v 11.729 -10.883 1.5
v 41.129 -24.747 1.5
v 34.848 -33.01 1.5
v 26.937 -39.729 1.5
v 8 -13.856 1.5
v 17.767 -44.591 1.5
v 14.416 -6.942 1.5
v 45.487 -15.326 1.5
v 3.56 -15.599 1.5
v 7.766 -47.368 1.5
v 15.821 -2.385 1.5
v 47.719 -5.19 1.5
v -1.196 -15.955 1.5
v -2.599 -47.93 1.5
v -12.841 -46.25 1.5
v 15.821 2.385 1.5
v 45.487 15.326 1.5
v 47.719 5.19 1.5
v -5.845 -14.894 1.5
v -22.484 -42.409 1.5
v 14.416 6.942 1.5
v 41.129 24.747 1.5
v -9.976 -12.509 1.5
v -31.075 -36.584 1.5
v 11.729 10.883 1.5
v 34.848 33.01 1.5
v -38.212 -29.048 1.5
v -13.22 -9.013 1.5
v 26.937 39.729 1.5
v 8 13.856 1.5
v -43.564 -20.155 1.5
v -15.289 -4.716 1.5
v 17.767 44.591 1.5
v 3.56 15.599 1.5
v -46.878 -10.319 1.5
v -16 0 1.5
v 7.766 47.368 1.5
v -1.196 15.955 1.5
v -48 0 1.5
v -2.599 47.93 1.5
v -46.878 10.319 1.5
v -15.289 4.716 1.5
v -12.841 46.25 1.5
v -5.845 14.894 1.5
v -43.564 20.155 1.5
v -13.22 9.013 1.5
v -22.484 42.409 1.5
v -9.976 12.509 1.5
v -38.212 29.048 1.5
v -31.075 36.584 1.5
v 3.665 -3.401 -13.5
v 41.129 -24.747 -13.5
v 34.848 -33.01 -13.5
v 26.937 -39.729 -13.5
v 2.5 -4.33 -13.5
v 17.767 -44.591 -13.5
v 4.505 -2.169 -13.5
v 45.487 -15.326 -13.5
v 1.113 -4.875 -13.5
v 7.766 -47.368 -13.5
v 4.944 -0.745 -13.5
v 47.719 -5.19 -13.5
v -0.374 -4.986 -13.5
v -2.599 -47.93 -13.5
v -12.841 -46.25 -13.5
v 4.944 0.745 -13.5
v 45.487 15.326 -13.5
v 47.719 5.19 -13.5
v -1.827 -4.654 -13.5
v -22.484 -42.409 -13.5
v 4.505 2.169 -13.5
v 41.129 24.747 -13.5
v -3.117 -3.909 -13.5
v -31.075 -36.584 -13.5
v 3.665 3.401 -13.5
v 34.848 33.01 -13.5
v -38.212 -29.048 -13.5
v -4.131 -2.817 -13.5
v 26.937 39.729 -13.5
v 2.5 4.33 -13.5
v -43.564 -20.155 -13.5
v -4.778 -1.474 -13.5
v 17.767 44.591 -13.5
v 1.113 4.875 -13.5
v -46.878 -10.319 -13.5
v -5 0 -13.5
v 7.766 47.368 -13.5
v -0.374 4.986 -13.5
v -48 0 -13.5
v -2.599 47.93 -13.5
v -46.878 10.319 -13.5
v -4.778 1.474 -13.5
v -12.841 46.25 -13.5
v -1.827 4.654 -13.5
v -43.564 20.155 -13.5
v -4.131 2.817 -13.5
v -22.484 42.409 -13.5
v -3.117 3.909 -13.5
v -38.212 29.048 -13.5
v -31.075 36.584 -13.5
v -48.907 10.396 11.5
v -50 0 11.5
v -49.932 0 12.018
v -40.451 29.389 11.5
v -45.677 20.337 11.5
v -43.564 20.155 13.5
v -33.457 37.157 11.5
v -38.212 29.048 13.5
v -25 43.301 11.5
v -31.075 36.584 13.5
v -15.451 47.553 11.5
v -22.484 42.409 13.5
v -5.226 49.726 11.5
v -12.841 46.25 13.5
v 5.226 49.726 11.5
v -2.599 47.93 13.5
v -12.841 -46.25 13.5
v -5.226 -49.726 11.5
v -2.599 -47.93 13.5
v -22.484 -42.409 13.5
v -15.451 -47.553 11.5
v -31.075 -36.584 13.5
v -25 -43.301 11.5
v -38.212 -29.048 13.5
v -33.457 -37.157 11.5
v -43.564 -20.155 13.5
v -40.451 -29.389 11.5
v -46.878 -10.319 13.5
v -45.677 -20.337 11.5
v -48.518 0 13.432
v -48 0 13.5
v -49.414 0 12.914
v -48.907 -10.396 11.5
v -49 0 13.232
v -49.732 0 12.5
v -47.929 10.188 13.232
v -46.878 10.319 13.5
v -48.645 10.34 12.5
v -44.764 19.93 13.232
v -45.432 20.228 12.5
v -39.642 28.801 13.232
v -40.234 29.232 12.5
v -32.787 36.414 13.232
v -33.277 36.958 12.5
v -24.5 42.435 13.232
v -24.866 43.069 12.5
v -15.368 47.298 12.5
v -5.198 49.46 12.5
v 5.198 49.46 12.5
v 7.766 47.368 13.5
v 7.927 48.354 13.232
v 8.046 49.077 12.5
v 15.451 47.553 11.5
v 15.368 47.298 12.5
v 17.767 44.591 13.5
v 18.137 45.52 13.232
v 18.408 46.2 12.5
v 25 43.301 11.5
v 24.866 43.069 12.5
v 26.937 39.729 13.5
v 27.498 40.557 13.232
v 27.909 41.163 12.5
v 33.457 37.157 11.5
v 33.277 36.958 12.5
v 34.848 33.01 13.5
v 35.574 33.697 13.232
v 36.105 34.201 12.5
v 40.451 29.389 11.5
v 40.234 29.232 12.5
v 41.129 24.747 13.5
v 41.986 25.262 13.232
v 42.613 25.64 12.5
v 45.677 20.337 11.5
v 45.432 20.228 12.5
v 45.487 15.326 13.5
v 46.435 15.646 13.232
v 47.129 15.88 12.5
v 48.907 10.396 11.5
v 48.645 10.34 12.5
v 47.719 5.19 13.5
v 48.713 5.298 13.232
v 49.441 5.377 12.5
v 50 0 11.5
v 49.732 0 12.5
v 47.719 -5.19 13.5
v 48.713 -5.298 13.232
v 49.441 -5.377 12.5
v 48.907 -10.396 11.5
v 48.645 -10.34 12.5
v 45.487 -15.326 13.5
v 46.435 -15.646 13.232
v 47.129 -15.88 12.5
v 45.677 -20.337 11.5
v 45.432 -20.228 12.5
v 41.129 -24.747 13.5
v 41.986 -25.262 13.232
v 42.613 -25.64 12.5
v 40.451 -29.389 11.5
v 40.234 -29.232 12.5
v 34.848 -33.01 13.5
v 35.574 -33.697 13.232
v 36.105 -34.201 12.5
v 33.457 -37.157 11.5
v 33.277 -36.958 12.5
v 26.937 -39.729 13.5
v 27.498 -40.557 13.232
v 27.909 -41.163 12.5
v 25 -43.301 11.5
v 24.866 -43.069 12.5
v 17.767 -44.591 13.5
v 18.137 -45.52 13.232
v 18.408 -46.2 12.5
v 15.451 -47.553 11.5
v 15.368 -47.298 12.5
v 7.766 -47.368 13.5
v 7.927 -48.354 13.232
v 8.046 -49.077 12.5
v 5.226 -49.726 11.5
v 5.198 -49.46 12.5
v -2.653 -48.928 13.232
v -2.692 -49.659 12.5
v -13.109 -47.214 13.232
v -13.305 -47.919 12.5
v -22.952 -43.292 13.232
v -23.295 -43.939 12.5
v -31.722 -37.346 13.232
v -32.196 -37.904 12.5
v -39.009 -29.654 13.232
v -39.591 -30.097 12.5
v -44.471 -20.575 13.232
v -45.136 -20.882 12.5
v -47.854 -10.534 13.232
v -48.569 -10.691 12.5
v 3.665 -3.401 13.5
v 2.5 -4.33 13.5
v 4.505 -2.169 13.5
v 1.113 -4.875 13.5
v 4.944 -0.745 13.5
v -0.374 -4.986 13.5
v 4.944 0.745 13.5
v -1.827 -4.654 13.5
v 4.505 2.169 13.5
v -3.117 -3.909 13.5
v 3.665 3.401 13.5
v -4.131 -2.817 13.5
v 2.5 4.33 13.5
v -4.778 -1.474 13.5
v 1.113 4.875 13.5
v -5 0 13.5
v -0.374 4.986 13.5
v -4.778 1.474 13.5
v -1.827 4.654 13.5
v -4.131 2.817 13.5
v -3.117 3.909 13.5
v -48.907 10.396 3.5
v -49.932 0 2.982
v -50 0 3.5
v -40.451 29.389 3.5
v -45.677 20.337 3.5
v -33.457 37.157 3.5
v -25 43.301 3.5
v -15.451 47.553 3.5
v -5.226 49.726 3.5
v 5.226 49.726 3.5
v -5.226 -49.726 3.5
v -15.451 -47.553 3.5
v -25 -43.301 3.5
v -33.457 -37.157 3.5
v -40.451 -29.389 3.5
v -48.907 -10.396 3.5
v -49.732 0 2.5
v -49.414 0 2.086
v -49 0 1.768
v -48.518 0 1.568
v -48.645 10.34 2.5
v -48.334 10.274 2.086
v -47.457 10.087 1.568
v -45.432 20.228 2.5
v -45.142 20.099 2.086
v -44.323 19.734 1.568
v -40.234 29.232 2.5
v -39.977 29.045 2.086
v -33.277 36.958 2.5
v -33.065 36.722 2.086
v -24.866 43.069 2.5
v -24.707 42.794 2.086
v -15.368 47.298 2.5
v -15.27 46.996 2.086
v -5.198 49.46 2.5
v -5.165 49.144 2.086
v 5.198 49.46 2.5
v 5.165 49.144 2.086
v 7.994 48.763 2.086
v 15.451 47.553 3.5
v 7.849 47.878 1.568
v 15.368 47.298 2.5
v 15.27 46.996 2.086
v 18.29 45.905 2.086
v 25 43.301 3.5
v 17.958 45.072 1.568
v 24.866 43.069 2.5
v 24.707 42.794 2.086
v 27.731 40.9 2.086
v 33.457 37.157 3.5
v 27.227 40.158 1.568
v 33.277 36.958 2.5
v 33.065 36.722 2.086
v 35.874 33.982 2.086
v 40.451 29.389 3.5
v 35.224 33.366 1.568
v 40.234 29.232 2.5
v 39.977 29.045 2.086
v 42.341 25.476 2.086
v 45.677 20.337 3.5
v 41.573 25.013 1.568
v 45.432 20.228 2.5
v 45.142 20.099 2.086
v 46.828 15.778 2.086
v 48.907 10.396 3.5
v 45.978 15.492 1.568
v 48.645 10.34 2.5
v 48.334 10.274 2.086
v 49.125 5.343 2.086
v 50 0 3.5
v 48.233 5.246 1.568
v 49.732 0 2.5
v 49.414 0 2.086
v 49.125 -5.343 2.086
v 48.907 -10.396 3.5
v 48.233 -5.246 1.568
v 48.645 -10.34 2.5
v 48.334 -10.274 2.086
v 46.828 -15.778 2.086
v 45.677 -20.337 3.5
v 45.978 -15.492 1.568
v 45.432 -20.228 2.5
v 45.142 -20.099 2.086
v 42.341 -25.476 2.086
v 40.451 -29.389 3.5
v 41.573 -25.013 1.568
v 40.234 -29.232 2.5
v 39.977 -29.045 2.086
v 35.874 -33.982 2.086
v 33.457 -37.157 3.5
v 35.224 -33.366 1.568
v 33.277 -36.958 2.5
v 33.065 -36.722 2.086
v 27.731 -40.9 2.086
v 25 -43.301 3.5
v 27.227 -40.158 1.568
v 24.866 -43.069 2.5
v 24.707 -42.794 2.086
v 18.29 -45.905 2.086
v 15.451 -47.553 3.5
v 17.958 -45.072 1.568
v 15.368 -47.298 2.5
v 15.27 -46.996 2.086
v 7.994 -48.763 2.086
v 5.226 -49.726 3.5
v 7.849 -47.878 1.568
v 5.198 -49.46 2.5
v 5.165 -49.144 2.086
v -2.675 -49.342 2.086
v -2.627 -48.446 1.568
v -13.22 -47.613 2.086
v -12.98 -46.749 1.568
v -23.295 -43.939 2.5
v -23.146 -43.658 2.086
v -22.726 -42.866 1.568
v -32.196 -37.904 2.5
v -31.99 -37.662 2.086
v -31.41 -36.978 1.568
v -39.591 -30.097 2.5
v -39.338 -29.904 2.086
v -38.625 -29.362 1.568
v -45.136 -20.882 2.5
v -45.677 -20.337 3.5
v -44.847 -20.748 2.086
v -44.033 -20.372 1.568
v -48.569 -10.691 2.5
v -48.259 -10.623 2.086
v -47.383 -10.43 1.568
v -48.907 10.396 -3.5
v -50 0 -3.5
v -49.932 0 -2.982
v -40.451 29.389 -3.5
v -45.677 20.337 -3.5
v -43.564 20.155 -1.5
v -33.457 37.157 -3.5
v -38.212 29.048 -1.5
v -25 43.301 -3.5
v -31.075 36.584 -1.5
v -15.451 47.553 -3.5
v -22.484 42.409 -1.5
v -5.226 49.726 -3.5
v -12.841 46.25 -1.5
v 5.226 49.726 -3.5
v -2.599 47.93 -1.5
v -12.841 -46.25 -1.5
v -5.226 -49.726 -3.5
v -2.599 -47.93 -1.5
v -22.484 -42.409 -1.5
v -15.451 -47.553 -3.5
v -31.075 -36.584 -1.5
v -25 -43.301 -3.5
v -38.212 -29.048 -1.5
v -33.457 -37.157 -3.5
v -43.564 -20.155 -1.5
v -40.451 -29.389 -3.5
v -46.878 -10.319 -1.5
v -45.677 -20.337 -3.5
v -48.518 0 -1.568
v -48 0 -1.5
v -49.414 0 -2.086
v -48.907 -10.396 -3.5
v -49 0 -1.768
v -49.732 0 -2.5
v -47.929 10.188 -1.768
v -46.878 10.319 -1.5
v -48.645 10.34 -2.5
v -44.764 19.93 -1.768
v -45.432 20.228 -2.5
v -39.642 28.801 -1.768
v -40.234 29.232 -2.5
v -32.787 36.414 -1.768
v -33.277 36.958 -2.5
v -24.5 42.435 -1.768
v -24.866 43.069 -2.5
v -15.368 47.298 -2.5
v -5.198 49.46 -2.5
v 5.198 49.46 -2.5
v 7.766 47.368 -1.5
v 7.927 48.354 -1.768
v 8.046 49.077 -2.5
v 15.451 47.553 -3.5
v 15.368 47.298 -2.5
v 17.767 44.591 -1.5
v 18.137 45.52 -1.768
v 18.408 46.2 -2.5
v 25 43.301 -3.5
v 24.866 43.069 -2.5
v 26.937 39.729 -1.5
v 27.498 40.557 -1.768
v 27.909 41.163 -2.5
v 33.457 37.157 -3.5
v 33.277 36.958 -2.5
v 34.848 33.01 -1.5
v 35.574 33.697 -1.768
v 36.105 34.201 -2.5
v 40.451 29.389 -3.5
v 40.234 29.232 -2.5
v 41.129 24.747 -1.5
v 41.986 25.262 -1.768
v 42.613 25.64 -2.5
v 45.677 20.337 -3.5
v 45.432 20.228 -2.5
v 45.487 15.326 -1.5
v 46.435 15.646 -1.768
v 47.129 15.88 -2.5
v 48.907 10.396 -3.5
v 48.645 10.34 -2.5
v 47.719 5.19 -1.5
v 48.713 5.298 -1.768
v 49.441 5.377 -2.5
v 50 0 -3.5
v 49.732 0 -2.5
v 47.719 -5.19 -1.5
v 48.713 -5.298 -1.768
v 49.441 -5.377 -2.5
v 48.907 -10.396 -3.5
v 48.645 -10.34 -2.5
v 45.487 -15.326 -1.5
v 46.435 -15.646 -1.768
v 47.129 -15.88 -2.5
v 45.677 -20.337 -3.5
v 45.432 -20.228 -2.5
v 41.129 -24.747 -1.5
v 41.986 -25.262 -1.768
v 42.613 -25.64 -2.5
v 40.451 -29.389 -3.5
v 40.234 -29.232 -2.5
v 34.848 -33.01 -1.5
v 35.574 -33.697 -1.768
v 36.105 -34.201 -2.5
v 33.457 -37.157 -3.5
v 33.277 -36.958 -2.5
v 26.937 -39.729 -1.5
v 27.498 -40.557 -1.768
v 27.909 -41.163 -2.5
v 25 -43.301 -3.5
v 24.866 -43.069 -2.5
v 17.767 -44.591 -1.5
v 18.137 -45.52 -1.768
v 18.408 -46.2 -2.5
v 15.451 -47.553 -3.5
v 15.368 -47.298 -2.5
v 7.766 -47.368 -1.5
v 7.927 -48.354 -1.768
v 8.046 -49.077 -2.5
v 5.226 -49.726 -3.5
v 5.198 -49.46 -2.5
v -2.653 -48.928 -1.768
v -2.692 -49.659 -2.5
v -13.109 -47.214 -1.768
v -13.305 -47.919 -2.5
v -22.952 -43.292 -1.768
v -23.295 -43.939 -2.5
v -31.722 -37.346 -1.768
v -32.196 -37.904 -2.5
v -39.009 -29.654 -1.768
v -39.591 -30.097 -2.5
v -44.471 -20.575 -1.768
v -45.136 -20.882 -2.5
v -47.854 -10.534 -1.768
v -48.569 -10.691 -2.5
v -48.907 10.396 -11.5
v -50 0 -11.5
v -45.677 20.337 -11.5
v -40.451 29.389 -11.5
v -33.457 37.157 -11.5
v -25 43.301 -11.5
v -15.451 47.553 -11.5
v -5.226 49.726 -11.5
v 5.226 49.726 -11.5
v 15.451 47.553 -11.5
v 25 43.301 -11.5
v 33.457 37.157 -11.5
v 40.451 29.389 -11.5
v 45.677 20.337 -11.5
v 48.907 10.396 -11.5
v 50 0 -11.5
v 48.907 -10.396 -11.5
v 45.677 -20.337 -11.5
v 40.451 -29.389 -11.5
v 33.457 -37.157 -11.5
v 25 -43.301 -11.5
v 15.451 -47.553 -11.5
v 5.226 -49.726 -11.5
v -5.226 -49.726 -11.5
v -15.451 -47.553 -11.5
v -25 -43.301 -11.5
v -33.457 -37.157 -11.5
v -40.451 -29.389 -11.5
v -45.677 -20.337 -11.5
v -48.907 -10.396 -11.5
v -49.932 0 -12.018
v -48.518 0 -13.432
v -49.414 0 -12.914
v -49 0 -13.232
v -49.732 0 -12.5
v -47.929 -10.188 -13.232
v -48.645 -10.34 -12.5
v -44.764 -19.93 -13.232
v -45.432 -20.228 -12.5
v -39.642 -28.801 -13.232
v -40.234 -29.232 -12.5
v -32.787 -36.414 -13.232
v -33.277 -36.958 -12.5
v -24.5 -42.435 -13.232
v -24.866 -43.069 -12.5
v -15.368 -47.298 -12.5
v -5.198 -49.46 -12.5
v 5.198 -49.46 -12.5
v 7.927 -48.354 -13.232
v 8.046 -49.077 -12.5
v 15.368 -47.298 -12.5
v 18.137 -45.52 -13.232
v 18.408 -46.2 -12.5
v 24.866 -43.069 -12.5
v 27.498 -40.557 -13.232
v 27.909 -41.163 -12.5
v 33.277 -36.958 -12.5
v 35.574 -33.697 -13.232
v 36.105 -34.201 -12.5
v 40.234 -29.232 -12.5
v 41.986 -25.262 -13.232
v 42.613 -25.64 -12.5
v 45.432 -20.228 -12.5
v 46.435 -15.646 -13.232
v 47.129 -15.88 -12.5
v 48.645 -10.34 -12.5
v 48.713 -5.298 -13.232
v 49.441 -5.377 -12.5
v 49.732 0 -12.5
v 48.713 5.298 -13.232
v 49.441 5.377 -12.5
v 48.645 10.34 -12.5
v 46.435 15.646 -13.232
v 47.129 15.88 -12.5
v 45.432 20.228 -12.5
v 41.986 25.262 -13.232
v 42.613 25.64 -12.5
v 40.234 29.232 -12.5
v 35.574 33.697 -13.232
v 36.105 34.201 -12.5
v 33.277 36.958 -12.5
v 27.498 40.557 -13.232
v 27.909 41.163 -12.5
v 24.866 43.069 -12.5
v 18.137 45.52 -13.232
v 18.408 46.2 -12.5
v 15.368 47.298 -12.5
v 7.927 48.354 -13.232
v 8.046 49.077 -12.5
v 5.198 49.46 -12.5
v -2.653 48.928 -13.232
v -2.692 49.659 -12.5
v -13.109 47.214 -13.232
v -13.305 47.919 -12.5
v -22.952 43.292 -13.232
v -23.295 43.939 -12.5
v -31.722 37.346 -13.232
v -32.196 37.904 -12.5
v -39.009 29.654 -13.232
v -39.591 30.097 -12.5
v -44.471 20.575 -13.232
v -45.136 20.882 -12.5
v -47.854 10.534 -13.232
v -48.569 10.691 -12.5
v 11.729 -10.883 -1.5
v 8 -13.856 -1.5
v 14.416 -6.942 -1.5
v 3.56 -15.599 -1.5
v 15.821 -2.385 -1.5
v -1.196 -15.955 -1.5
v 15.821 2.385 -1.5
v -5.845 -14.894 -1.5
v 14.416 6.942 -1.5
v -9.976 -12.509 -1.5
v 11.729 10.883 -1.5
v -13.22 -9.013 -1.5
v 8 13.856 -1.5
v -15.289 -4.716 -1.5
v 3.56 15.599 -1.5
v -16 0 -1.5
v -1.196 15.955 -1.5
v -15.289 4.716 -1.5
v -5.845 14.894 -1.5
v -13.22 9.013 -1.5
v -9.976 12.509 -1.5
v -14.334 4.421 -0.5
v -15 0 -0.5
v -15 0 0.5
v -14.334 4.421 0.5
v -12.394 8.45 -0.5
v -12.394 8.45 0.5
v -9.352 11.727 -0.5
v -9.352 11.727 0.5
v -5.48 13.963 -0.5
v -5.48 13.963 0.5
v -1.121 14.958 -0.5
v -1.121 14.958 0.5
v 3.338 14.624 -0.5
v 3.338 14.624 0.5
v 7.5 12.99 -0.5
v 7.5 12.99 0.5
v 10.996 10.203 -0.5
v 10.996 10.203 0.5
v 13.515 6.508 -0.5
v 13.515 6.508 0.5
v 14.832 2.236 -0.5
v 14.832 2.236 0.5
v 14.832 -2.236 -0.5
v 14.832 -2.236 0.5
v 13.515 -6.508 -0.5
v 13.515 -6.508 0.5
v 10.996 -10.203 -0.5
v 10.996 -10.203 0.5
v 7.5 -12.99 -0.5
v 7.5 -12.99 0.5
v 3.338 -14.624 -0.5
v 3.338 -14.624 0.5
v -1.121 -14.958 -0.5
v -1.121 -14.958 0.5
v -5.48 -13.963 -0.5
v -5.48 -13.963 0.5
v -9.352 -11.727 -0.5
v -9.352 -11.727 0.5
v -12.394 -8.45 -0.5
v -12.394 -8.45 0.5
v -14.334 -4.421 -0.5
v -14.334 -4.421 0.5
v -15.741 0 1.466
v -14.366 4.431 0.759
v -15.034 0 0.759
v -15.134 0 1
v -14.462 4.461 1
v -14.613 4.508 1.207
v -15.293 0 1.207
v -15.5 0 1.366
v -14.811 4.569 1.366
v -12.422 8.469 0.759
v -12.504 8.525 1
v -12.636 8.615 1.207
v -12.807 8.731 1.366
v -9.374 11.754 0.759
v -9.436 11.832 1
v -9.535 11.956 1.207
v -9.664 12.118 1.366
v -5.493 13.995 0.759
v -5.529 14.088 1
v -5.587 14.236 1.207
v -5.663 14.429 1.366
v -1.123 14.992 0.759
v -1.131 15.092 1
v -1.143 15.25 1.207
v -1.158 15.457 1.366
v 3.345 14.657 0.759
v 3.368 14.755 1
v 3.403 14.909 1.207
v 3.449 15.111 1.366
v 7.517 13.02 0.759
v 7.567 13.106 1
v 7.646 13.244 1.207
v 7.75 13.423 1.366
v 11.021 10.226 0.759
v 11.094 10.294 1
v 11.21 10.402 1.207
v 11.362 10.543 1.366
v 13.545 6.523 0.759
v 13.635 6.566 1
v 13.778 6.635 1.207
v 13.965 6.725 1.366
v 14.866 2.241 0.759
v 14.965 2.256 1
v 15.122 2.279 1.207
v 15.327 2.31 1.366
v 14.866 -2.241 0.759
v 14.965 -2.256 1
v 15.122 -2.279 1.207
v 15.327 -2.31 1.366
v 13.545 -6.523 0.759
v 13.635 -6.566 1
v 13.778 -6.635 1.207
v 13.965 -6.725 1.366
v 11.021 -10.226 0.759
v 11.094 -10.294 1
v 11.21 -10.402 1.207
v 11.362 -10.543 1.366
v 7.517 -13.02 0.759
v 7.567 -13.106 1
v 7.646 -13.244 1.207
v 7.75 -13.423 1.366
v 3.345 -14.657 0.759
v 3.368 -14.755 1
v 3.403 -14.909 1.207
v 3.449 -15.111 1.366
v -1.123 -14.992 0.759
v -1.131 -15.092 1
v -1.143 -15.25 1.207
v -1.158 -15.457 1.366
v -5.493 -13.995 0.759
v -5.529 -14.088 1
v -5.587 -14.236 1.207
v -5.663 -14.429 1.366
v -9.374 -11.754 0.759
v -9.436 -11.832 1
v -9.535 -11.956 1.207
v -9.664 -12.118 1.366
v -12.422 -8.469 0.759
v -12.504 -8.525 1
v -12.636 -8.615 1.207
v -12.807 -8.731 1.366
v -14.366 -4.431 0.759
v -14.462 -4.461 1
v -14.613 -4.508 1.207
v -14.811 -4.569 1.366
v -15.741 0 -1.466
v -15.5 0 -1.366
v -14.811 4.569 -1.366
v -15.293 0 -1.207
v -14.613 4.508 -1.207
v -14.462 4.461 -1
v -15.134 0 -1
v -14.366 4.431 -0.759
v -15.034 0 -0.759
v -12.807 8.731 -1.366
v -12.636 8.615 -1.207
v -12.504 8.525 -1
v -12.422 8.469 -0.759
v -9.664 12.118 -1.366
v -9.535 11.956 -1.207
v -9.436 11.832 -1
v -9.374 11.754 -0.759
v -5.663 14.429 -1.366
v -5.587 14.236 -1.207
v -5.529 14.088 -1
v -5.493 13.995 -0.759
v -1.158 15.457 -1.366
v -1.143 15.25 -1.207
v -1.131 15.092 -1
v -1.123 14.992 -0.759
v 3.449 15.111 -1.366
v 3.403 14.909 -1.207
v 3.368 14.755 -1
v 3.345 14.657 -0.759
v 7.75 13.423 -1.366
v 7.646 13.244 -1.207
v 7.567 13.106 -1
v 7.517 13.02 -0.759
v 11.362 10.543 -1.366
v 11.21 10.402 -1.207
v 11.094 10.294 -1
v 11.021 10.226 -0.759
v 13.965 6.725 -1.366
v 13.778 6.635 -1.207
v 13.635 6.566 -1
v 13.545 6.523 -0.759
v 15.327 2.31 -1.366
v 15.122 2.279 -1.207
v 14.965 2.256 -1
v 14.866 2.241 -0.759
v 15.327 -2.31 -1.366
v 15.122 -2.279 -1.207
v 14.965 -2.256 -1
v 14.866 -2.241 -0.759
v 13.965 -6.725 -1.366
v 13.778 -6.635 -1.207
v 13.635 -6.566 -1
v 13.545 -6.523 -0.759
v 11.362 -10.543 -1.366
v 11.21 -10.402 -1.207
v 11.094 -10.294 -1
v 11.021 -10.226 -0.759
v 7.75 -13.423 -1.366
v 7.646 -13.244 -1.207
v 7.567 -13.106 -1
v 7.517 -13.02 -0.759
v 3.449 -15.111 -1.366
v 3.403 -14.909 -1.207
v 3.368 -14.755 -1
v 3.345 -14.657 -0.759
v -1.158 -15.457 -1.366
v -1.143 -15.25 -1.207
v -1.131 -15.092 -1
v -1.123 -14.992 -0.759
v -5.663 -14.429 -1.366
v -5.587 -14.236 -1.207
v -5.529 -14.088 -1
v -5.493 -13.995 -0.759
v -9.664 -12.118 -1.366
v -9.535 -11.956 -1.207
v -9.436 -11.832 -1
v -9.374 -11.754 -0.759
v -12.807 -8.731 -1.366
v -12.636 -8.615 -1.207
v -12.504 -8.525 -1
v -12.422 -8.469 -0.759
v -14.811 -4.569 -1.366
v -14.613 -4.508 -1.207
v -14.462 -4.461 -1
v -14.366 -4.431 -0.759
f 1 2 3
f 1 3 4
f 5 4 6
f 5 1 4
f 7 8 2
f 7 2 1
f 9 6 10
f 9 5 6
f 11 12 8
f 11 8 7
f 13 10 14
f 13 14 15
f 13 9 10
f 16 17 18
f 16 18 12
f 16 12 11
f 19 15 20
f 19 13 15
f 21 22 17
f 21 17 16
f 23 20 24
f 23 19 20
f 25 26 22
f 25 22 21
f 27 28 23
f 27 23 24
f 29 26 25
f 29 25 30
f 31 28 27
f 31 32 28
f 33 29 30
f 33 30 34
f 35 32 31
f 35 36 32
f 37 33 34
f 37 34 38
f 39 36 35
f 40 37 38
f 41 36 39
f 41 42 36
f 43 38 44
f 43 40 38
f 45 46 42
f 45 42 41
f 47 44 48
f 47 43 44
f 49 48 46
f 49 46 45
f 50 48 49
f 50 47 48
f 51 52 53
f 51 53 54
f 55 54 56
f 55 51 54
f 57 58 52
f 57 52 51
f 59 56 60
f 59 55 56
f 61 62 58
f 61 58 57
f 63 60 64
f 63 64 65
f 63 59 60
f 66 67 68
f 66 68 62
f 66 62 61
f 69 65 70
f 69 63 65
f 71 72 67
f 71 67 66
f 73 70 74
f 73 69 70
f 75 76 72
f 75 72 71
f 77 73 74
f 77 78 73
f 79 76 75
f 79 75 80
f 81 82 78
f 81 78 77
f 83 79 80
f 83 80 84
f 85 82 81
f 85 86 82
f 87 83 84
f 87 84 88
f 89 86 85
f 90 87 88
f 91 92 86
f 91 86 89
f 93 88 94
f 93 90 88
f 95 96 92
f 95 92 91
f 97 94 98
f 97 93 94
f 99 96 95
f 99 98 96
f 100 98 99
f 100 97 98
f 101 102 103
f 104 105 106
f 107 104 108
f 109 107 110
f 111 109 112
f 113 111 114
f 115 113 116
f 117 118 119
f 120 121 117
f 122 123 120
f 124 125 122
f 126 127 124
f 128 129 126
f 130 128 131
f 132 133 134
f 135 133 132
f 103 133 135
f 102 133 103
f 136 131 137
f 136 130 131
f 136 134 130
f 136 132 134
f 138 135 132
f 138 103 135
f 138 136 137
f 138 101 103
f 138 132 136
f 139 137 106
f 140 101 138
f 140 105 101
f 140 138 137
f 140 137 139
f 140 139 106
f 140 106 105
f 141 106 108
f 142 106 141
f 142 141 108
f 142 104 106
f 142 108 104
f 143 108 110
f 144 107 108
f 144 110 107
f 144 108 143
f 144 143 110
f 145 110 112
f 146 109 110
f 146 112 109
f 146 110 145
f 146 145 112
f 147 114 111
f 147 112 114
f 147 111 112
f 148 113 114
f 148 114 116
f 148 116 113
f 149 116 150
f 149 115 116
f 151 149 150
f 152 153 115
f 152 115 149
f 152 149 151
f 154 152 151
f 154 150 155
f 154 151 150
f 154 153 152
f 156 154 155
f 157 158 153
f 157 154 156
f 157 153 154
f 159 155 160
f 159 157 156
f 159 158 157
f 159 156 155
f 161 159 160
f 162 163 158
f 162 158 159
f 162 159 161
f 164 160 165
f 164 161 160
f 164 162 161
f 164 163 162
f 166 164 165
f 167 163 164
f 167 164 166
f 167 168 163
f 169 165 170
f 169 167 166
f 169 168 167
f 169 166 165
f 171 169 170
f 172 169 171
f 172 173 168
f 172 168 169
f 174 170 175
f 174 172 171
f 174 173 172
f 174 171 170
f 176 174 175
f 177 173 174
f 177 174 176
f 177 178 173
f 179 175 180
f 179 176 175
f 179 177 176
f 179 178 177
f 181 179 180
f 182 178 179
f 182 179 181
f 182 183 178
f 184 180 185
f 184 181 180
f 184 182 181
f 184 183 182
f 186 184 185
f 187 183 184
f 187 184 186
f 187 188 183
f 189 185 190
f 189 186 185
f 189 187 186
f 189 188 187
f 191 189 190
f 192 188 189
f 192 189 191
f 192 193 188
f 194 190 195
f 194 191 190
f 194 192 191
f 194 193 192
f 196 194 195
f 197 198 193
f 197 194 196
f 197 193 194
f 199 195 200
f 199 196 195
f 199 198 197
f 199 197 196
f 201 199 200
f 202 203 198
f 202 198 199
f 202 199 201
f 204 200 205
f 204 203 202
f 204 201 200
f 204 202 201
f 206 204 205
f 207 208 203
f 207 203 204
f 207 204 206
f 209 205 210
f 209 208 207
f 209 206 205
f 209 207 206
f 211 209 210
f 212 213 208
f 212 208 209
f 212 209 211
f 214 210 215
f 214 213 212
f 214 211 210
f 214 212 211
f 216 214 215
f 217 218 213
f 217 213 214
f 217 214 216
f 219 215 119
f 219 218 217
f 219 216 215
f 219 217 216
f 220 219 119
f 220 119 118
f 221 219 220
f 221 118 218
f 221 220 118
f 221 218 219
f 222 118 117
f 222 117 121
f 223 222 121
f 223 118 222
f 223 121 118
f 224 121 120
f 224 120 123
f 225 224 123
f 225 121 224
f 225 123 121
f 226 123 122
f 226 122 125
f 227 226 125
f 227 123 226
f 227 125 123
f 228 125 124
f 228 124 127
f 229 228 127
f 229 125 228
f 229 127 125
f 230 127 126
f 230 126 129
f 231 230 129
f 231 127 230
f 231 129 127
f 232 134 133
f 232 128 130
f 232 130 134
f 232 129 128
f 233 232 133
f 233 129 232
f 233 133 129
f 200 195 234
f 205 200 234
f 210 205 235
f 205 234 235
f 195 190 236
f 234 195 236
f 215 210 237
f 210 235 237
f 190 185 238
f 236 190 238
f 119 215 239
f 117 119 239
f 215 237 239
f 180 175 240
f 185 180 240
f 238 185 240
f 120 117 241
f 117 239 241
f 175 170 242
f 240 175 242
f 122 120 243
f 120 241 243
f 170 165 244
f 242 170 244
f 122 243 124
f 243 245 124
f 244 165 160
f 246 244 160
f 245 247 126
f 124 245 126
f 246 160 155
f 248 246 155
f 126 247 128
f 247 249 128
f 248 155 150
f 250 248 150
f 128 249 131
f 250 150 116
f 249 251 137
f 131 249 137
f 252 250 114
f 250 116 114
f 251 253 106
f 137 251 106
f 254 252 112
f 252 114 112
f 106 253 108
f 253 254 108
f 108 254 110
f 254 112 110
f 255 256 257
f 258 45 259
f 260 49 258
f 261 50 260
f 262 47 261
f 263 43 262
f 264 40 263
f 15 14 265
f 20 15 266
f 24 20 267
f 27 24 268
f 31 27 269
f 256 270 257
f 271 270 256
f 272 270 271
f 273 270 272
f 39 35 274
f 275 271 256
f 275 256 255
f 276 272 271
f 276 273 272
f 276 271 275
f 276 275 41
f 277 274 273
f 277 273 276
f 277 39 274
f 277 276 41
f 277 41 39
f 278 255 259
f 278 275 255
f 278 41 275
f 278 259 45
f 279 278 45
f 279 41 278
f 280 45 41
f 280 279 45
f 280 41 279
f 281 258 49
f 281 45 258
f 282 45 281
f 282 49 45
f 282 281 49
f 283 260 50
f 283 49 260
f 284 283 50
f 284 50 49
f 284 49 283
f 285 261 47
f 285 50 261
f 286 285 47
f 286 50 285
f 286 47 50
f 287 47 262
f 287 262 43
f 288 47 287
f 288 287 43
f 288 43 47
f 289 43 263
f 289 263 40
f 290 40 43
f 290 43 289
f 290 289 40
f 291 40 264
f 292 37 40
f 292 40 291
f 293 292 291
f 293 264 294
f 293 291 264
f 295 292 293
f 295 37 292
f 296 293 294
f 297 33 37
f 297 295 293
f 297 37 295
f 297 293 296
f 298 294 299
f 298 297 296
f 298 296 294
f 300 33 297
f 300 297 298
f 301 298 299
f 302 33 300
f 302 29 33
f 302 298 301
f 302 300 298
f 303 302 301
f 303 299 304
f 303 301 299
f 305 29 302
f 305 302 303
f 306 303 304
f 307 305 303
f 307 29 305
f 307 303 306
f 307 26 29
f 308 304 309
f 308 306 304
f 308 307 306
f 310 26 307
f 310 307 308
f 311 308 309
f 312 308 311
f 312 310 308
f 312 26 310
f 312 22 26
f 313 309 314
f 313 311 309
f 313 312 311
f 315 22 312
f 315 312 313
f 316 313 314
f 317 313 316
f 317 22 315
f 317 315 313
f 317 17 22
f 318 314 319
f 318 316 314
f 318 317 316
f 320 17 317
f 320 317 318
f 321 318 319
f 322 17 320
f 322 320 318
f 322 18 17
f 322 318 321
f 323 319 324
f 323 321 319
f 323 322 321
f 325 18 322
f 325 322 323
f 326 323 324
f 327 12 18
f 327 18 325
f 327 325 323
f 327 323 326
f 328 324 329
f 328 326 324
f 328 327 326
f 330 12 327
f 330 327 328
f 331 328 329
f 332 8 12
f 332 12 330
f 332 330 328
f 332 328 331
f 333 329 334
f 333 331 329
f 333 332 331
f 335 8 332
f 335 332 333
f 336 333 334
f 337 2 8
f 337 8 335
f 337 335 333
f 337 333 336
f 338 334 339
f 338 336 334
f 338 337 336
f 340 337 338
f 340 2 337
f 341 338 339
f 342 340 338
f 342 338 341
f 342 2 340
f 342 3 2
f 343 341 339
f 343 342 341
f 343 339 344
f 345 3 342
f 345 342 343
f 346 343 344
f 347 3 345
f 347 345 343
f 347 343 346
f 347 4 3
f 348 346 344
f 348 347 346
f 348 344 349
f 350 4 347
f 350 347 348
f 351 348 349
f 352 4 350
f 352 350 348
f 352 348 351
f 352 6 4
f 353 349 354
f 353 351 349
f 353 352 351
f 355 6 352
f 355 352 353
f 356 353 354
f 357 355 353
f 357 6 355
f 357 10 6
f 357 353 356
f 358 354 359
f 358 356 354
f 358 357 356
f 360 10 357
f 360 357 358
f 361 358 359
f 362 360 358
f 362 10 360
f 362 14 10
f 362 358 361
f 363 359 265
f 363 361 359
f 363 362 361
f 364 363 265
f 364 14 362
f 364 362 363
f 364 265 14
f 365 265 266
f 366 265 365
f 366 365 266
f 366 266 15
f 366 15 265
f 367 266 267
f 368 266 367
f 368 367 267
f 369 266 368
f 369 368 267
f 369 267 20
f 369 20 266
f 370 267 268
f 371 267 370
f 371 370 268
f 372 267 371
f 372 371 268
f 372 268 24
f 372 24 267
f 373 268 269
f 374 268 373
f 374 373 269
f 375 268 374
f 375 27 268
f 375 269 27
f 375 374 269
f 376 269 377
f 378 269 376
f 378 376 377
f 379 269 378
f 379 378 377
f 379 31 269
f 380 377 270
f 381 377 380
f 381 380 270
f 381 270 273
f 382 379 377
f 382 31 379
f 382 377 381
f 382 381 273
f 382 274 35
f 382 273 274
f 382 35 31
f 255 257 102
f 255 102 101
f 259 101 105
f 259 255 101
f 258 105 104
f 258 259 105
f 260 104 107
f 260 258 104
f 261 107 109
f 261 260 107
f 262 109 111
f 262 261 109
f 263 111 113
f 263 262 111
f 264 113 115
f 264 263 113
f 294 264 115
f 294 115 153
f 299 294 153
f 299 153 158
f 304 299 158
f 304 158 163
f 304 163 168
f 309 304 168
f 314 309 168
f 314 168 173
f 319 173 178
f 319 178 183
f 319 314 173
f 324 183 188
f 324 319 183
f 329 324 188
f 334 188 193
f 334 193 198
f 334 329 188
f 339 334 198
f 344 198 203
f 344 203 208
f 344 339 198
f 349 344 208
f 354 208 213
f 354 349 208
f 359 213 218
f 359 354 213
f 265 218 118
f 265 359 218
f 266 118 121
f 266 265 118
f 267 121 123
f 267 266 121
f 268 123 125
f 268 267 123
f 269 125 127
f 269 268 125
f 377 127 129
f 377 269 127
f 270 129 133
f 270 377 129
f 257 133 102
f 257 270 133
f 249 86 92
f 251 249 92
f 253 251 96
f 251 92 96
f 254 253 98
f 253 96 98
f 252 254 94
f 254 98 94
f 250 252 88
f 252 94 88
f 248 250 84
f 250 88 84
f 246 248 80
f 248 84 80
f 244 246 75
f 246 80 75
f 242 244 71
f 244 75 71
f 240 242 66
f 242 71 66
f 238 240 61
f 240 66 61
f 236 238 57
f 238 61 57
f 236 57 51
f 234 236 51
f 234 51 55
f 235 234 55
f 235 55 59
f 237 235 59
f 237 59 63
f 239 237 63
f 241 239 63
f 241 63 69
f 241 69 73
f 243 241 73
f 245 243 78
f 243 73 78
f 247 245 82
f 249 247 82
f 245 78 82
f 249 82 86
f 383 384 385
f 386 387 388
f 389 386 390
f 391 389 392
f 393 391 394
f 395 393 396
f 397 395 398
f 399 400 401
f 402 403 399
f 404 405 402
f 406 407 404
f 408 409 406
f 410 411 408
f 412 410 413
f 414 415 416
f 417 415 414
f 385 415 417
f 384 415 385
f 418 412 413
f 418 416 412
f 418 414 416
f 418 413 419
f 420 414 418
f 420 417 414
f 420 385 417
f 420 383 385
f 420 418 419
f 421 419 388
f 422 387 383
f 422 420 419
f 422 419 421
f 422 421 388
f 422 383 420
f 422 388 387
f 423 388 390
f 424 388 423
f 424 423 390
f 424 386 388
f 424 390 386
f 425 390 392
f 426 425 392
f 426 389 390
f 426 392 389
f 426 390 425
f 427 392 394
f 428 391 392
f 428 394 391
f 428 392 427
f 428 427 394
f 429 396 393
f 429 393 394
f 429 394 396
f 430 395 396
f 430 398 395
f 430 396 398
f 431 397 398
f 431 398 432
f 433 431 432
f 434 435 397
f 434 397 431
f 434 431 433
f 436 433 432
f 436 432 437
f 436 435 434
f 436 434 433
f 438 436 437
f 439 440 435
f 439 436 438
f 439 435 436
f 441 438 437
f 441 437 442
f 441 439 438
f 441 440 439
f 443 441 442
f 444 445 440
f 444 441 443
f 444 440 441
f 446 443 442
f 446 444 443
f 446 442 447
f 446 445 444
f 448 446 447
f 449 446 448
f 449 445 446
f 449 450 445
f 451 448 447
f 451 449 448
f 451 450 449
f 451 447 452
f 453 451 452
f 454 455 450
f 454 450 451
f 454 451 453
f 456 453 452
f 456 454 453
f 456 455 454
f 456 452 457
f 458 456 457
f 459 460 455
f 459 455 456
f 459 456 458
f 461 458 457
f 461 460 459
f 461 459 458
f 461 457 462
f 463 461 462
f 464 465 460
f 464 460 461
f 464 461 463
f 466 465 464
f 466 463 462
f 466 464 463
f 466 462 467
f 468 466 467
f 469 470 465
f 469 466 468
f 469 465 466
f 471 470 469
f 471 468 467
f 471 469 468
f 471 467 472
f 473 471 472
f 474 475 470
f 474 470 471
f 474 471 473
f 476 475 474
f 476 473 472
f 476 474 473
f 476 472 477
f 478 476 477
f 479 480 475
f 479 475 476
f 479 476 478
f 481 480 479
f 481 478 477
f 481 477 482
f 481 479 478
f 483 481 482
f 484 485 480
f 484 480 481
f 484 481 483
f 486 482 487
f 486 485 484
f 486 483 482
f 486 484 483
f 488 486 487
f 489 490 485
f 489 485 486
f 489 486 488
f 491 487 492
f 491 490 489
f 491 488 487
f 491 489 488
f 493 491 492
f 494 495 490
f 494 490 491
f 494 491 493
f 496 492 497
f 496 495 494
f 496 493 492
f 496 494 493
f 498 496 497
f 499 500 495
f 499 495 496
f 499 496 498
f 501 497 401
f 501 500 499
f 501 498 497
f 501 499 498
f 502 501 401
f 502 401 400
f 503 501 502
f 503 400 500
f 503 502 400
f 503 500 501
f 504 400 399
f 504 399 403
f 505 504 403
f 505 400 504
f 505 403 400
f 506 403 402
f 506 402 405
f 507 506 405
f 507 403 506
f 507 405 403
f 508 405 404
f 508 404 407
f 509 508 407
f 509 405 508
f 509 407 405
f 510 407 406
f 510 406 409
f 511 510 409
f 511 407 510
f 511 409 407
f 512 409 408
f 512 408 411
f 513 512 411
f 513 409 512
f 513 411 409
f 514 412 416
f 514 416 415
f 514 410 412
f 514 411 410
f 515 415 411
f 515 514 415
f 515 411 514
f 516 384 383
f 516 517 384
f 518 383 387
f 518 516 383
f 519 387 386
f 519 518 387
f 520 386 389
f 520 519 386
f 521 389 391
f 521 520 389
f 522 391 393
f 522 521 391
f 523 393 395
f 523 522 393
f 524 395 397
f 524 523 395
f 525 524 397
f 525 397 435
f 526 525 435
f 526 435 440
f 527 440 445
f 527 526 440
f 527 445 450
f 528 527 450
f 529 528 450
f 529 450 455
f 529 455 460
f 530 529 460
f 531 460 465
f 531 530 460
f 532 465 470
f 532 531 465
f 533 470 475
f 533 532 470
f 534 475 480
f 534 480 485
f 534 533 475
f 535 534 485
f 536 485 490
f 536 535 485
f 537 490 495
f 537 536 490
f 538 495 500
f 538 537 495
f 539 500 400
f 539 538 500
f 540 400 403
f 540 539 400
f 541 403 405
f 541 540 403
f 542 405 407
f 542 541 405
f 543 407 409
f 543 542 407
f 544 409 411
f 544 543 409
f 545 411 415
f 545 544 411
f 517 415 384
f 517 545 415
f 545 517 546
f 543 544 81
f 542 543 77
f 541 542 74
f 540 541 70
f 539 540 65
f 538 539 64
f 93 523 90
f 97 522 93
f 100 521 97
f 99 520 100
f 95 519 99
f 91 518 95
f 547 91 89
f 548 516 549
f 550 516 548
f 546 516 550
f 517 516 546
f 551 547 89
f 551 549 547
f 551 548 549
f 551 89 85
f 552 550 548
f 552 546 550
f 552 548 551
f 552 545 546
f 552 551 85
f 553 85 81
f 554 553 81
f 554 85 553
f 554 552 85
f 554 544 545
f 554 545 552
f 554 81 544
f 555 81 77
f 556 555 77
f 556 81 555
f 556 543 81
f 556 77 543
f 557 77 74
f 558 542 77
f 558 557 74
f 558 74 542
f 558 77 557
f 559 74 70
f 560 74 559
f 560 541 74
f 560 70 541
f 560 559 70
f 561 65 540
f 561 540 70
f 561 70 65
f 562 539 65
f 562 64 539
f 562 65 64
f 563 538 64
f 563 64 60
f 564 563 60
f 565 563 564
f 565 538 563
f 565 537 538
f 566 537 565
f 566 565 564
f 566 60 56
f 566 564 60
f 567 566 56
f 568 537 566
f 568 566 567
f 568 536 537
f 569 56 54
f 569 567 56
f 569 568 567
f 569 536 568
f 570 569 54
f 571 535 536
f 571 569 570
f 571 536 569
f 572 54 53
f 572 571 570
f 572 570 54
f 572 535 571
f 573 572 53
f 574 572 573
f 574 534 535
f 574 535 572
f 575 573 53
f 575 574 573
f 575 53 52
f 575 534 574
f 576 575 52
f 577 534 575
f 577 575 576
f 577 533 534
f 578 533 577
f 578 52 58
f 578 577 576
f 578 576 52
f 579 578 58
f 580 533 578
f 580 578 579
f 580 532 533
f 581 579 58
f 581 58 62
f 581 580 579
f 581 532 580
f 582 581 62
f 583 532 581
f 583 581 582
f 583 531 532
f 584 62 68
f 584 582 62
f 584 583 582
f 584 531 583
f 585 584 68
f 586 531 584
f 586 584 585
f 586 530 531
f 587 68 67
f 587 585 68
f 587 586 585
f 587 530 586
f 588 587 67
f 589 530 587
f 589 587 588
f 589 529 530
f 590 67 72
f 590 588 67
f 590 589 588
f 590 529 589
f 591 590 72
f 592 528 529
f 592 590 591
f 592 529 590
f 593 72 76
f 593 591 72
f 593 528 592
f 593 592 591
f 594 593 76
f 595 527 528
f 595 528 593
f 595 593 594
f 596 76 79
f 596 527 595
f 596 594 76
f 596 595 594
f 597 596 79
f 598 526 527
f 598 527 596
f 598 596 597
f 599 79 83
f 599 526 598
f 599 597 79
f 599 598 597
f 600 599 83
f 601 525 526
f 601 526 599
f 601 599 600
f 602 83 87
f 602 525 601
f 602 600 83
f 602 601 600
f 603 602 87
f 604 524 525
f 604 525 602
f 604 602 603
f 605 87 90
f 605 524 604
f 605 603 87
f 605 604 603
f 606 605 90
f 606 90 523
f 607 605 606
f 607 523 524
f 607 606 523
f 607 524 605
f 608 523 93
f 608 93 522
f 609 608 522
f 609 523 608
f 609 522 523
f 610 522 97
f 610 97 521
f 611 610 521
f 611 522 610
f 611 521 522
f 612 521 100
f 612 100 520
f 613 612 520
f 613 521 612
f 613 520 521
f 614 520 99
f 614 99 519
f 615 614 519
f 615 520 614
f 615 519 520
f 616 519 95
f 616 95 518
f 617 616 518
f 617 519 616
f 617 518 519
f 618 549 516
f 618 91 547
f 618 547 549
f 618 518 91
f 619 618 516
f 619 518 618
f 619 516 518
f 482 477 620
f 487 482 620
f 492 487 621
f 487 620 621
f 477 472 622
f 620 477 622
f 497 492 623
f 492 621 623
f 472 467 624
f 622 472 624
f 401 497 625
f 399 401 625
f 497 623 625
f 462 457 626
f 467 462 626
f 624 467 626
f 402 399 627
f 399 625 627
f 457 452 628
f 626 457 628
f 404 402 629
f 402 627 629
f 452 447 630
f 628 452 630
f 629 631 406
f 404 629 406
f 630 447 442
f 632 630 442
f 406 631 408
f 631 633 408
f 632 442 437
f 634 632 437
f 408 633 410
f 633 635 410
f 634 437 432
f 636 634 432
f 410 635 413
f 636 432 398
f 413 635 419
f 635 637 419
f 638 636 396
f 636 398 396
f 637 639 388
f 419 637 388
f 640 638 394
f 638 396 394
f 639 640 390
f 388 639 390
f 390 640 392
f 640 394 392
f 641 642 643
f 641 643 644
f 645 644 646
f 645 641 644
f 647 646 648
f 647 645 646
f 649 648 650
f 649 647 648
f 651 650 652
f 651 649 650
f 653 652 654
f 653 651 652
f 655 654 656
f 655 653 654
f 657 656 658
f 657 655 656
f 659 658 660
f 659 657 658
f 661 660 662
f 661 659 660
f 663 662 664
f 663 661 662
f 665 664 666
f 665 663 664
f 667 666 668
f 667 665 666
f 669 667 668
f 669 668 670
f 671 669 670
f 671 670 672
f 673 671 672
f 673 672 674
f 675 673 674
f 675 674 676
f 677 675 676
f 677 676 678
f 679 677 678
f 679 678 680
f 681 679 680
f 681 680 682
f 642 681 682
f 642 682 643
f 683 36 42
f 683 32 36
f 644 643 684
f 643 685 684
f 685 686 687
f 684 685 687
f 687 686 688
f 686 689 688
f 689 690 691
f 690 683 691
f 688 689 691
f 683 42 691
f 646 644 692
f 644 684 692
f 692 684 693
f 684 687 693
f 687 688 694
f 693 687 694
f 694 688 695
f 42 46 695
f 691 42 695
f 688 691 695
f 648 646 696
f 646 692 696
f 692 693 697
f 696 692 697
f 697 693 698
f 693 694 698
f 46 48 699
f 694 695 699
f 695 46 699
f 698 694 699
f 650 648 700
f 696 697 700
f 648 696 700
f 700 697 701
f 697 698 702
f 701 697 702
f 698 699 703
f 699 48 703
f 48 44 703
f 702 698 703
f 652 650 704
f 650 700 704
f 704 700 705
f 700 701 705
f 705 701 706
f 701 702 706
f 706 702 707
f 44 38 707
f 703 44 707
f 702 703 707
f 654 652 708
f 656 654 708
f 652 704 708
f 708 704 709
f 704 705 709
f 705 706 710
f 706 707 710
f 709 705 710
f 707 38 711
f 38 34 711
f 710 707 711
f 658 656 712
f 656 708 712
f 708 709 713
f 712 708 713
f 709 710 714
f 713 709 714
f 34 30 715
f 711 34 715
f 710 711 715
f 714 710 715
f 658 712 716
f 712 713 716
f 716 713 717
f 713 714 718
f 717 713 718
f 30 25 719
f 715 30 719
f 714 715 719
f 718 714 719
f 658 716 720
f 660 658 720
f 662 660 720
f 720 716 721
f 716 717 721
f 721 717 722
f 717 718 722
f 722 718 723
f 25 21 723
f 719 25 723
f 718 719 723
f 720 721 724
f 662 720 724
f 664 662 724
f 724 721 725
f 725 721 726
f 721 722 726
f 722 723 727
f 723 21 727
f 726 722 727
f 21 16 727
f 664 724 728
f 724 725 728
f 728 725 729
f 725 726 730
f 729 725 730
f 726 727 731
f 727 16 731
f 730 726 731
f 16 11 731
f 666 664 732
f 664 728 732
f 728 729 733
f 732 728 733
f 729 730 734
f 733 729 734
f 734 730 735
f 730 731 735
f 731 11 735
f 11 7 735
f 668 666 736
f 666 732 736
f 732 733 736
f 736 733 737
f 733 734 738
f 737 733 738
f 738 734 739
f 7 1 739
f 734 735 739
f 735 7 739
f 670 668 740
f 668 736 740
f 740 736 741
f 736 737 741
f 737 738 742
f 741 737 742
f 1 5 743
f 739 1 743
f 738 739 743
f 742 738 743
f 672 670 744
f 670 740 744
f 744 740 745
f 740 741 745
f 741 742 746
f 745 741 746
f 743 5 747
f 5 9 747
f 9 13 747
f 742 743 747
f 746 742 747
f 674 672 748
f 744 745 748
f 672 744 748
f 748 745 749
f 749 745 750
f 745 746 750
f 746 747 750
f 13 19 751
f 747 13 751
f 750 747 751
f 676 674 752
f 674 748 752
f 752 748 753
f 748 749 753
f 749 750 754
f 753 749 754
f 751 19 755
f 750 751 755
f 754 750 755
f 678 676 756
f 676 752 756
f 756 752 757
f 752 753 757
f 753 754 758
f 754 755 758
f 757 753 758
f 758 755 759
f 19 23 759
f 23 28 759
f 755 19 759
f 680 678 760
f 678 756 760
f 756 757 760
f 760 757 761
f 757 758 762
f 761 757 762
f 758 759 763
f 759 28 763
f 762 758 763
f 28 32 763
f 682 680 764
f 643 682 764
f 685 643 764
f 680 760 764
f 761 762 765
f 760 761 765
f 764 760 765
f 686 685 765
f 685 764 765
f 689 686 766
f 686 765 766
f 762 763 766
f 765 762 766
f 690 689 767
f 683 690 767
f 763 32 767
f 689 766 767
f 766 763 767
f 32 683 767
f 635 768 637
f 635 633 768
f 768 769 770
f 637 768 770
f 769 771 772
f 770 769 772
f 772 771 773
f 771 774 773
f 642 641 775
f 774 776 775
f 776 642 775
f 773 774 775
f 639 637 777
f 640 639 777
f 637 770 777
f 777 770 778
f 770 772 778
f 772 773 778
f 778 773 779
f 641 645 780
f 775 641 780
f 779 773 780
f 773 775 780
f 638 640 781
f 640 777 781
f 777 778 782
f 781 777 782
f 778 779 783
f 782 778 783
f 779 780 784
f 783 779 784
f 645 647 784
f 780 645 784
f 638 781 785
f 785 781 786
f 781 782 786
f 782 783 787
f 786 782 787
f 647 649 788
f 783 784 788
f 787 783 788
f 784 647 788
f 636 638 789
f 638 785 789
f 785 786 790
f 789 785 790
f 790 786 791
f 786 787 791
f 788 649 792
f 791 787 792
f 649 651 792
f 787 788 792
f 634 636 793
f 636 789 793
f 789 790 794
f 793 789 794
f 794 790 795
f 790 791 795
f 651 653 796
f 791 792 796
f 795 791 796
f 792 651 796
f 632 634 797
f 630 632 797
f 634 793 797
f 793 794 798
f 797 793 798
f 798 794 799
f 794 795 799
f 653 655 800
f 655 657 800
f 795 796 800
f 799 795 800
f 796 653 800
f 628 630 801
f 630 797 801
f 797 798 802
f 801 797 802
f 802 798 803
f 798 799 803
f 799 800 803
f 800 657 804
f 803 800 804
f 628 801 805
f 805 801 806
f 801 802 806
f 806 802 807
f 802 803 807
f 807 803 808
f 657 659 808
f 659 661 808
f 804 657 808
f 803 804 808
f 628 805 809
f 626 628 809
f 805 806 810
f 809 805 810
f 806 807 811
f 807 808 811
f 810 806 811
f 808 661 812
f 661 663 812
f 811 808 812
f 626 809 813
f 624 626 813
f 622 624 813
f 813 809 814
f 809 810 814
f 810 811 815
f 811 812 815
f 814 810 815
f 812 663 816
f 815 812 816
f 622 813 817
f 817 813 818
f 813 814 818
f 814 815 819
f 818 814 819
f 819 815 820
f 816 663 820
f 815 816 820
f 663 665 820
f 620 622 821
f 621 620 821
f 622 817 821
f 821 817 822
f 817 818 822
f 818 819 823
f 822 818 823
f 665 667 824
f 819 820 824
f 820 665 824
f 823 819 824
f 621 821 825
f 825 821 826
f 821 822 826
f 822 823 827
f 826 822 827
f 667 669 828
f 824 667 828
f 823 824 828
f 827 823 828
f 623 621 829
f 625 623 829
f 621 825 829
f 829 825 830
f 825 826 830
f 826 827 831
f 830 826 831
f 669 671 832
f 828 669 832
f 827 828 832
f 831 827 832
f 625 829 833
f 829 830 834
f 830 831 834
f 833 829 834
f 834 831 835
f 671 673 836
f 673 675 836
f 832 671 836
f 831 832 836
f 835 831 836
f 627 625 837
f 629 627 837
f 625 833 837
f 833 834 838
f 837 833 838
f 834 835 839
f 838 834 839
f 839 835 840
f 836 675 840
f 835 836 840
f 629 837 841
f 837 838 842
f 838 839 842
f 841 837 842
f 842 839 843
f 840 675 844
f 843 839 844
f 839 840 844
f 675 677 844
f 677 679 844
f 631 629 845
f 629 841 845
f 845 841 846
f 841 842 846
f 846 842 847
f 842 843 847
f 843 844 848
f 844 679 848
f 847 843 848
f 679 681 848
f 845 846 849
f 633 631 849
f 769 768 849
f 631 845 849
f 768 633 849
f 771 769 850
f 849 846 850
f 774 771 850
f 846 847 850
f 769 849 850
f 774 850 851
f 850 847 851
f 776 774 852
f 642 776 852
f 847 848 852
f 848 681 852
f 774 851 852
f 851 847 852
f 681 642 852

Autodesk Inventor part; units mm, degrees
ref_plane "YZ Plane" through (0, 0, 0) normal (1, 0, 0) x (0, 1, 0)
ref_plane "XZ Plane" through (0, 0, 0) normal (0, 1, 0) x (-1, 0, 0)
ref_plane "XY Plane" through (0, 0, 0) normal (0, 0, 1) x (1, 0, 0)
sketch "Sketch1" plane through (0, 0, 0) normal (0, 1, 0) x (-1, 0, 0)
  line L0 (50, -13.5) -> (5, -13.5)
  line L1 (5, 13.5) -> (50, 13.5)
  line L2 (50, 13.5) -> (50, 1.5)
  line L3 (50, 1.5) -> (15, 1.5)
  line L4 (15, 1.5) -> (15, -1.5)
  line L5 (15, -1.5) -> (50, -1.5)
  line L6 (50, -1.5) -> (50, -13.5)
  line L7 (0, 147.0752) -> (0, -168.5589)
  line L8 (5, 13.5) -> (5, -13.5)
  point P0 (0, 0)
  dimension "d6" = 12
  dimension "d7" = 12
  dimension "d10" = 1.5
  dimension "d11" = 3
  dimension "d15" = 5
  dimension "d16" = 15
  dimension "d17" = 50
  dimension "d18" = 50
revolve "Revolution1" add sketch "Sketch1" angle 360 about axis through (0, 0, 147.0752) along (0, 0, -1)
fillet "Fillet2" radius 2 4 edges at (50, 0, 1.5) (50, 0, 13.5) (50, 0, -1.5) (50, 0, -13.5)
fillet "Fillet3" radius 1 2 edges at (15, 0, -1.5) (15, 0, 1.5)
equation "\"d7\" = d6"
equation "\"d10\" = 0.5 * d11"
equation "\"d18\" = d17"
properties part number "bushing_smConnection"
